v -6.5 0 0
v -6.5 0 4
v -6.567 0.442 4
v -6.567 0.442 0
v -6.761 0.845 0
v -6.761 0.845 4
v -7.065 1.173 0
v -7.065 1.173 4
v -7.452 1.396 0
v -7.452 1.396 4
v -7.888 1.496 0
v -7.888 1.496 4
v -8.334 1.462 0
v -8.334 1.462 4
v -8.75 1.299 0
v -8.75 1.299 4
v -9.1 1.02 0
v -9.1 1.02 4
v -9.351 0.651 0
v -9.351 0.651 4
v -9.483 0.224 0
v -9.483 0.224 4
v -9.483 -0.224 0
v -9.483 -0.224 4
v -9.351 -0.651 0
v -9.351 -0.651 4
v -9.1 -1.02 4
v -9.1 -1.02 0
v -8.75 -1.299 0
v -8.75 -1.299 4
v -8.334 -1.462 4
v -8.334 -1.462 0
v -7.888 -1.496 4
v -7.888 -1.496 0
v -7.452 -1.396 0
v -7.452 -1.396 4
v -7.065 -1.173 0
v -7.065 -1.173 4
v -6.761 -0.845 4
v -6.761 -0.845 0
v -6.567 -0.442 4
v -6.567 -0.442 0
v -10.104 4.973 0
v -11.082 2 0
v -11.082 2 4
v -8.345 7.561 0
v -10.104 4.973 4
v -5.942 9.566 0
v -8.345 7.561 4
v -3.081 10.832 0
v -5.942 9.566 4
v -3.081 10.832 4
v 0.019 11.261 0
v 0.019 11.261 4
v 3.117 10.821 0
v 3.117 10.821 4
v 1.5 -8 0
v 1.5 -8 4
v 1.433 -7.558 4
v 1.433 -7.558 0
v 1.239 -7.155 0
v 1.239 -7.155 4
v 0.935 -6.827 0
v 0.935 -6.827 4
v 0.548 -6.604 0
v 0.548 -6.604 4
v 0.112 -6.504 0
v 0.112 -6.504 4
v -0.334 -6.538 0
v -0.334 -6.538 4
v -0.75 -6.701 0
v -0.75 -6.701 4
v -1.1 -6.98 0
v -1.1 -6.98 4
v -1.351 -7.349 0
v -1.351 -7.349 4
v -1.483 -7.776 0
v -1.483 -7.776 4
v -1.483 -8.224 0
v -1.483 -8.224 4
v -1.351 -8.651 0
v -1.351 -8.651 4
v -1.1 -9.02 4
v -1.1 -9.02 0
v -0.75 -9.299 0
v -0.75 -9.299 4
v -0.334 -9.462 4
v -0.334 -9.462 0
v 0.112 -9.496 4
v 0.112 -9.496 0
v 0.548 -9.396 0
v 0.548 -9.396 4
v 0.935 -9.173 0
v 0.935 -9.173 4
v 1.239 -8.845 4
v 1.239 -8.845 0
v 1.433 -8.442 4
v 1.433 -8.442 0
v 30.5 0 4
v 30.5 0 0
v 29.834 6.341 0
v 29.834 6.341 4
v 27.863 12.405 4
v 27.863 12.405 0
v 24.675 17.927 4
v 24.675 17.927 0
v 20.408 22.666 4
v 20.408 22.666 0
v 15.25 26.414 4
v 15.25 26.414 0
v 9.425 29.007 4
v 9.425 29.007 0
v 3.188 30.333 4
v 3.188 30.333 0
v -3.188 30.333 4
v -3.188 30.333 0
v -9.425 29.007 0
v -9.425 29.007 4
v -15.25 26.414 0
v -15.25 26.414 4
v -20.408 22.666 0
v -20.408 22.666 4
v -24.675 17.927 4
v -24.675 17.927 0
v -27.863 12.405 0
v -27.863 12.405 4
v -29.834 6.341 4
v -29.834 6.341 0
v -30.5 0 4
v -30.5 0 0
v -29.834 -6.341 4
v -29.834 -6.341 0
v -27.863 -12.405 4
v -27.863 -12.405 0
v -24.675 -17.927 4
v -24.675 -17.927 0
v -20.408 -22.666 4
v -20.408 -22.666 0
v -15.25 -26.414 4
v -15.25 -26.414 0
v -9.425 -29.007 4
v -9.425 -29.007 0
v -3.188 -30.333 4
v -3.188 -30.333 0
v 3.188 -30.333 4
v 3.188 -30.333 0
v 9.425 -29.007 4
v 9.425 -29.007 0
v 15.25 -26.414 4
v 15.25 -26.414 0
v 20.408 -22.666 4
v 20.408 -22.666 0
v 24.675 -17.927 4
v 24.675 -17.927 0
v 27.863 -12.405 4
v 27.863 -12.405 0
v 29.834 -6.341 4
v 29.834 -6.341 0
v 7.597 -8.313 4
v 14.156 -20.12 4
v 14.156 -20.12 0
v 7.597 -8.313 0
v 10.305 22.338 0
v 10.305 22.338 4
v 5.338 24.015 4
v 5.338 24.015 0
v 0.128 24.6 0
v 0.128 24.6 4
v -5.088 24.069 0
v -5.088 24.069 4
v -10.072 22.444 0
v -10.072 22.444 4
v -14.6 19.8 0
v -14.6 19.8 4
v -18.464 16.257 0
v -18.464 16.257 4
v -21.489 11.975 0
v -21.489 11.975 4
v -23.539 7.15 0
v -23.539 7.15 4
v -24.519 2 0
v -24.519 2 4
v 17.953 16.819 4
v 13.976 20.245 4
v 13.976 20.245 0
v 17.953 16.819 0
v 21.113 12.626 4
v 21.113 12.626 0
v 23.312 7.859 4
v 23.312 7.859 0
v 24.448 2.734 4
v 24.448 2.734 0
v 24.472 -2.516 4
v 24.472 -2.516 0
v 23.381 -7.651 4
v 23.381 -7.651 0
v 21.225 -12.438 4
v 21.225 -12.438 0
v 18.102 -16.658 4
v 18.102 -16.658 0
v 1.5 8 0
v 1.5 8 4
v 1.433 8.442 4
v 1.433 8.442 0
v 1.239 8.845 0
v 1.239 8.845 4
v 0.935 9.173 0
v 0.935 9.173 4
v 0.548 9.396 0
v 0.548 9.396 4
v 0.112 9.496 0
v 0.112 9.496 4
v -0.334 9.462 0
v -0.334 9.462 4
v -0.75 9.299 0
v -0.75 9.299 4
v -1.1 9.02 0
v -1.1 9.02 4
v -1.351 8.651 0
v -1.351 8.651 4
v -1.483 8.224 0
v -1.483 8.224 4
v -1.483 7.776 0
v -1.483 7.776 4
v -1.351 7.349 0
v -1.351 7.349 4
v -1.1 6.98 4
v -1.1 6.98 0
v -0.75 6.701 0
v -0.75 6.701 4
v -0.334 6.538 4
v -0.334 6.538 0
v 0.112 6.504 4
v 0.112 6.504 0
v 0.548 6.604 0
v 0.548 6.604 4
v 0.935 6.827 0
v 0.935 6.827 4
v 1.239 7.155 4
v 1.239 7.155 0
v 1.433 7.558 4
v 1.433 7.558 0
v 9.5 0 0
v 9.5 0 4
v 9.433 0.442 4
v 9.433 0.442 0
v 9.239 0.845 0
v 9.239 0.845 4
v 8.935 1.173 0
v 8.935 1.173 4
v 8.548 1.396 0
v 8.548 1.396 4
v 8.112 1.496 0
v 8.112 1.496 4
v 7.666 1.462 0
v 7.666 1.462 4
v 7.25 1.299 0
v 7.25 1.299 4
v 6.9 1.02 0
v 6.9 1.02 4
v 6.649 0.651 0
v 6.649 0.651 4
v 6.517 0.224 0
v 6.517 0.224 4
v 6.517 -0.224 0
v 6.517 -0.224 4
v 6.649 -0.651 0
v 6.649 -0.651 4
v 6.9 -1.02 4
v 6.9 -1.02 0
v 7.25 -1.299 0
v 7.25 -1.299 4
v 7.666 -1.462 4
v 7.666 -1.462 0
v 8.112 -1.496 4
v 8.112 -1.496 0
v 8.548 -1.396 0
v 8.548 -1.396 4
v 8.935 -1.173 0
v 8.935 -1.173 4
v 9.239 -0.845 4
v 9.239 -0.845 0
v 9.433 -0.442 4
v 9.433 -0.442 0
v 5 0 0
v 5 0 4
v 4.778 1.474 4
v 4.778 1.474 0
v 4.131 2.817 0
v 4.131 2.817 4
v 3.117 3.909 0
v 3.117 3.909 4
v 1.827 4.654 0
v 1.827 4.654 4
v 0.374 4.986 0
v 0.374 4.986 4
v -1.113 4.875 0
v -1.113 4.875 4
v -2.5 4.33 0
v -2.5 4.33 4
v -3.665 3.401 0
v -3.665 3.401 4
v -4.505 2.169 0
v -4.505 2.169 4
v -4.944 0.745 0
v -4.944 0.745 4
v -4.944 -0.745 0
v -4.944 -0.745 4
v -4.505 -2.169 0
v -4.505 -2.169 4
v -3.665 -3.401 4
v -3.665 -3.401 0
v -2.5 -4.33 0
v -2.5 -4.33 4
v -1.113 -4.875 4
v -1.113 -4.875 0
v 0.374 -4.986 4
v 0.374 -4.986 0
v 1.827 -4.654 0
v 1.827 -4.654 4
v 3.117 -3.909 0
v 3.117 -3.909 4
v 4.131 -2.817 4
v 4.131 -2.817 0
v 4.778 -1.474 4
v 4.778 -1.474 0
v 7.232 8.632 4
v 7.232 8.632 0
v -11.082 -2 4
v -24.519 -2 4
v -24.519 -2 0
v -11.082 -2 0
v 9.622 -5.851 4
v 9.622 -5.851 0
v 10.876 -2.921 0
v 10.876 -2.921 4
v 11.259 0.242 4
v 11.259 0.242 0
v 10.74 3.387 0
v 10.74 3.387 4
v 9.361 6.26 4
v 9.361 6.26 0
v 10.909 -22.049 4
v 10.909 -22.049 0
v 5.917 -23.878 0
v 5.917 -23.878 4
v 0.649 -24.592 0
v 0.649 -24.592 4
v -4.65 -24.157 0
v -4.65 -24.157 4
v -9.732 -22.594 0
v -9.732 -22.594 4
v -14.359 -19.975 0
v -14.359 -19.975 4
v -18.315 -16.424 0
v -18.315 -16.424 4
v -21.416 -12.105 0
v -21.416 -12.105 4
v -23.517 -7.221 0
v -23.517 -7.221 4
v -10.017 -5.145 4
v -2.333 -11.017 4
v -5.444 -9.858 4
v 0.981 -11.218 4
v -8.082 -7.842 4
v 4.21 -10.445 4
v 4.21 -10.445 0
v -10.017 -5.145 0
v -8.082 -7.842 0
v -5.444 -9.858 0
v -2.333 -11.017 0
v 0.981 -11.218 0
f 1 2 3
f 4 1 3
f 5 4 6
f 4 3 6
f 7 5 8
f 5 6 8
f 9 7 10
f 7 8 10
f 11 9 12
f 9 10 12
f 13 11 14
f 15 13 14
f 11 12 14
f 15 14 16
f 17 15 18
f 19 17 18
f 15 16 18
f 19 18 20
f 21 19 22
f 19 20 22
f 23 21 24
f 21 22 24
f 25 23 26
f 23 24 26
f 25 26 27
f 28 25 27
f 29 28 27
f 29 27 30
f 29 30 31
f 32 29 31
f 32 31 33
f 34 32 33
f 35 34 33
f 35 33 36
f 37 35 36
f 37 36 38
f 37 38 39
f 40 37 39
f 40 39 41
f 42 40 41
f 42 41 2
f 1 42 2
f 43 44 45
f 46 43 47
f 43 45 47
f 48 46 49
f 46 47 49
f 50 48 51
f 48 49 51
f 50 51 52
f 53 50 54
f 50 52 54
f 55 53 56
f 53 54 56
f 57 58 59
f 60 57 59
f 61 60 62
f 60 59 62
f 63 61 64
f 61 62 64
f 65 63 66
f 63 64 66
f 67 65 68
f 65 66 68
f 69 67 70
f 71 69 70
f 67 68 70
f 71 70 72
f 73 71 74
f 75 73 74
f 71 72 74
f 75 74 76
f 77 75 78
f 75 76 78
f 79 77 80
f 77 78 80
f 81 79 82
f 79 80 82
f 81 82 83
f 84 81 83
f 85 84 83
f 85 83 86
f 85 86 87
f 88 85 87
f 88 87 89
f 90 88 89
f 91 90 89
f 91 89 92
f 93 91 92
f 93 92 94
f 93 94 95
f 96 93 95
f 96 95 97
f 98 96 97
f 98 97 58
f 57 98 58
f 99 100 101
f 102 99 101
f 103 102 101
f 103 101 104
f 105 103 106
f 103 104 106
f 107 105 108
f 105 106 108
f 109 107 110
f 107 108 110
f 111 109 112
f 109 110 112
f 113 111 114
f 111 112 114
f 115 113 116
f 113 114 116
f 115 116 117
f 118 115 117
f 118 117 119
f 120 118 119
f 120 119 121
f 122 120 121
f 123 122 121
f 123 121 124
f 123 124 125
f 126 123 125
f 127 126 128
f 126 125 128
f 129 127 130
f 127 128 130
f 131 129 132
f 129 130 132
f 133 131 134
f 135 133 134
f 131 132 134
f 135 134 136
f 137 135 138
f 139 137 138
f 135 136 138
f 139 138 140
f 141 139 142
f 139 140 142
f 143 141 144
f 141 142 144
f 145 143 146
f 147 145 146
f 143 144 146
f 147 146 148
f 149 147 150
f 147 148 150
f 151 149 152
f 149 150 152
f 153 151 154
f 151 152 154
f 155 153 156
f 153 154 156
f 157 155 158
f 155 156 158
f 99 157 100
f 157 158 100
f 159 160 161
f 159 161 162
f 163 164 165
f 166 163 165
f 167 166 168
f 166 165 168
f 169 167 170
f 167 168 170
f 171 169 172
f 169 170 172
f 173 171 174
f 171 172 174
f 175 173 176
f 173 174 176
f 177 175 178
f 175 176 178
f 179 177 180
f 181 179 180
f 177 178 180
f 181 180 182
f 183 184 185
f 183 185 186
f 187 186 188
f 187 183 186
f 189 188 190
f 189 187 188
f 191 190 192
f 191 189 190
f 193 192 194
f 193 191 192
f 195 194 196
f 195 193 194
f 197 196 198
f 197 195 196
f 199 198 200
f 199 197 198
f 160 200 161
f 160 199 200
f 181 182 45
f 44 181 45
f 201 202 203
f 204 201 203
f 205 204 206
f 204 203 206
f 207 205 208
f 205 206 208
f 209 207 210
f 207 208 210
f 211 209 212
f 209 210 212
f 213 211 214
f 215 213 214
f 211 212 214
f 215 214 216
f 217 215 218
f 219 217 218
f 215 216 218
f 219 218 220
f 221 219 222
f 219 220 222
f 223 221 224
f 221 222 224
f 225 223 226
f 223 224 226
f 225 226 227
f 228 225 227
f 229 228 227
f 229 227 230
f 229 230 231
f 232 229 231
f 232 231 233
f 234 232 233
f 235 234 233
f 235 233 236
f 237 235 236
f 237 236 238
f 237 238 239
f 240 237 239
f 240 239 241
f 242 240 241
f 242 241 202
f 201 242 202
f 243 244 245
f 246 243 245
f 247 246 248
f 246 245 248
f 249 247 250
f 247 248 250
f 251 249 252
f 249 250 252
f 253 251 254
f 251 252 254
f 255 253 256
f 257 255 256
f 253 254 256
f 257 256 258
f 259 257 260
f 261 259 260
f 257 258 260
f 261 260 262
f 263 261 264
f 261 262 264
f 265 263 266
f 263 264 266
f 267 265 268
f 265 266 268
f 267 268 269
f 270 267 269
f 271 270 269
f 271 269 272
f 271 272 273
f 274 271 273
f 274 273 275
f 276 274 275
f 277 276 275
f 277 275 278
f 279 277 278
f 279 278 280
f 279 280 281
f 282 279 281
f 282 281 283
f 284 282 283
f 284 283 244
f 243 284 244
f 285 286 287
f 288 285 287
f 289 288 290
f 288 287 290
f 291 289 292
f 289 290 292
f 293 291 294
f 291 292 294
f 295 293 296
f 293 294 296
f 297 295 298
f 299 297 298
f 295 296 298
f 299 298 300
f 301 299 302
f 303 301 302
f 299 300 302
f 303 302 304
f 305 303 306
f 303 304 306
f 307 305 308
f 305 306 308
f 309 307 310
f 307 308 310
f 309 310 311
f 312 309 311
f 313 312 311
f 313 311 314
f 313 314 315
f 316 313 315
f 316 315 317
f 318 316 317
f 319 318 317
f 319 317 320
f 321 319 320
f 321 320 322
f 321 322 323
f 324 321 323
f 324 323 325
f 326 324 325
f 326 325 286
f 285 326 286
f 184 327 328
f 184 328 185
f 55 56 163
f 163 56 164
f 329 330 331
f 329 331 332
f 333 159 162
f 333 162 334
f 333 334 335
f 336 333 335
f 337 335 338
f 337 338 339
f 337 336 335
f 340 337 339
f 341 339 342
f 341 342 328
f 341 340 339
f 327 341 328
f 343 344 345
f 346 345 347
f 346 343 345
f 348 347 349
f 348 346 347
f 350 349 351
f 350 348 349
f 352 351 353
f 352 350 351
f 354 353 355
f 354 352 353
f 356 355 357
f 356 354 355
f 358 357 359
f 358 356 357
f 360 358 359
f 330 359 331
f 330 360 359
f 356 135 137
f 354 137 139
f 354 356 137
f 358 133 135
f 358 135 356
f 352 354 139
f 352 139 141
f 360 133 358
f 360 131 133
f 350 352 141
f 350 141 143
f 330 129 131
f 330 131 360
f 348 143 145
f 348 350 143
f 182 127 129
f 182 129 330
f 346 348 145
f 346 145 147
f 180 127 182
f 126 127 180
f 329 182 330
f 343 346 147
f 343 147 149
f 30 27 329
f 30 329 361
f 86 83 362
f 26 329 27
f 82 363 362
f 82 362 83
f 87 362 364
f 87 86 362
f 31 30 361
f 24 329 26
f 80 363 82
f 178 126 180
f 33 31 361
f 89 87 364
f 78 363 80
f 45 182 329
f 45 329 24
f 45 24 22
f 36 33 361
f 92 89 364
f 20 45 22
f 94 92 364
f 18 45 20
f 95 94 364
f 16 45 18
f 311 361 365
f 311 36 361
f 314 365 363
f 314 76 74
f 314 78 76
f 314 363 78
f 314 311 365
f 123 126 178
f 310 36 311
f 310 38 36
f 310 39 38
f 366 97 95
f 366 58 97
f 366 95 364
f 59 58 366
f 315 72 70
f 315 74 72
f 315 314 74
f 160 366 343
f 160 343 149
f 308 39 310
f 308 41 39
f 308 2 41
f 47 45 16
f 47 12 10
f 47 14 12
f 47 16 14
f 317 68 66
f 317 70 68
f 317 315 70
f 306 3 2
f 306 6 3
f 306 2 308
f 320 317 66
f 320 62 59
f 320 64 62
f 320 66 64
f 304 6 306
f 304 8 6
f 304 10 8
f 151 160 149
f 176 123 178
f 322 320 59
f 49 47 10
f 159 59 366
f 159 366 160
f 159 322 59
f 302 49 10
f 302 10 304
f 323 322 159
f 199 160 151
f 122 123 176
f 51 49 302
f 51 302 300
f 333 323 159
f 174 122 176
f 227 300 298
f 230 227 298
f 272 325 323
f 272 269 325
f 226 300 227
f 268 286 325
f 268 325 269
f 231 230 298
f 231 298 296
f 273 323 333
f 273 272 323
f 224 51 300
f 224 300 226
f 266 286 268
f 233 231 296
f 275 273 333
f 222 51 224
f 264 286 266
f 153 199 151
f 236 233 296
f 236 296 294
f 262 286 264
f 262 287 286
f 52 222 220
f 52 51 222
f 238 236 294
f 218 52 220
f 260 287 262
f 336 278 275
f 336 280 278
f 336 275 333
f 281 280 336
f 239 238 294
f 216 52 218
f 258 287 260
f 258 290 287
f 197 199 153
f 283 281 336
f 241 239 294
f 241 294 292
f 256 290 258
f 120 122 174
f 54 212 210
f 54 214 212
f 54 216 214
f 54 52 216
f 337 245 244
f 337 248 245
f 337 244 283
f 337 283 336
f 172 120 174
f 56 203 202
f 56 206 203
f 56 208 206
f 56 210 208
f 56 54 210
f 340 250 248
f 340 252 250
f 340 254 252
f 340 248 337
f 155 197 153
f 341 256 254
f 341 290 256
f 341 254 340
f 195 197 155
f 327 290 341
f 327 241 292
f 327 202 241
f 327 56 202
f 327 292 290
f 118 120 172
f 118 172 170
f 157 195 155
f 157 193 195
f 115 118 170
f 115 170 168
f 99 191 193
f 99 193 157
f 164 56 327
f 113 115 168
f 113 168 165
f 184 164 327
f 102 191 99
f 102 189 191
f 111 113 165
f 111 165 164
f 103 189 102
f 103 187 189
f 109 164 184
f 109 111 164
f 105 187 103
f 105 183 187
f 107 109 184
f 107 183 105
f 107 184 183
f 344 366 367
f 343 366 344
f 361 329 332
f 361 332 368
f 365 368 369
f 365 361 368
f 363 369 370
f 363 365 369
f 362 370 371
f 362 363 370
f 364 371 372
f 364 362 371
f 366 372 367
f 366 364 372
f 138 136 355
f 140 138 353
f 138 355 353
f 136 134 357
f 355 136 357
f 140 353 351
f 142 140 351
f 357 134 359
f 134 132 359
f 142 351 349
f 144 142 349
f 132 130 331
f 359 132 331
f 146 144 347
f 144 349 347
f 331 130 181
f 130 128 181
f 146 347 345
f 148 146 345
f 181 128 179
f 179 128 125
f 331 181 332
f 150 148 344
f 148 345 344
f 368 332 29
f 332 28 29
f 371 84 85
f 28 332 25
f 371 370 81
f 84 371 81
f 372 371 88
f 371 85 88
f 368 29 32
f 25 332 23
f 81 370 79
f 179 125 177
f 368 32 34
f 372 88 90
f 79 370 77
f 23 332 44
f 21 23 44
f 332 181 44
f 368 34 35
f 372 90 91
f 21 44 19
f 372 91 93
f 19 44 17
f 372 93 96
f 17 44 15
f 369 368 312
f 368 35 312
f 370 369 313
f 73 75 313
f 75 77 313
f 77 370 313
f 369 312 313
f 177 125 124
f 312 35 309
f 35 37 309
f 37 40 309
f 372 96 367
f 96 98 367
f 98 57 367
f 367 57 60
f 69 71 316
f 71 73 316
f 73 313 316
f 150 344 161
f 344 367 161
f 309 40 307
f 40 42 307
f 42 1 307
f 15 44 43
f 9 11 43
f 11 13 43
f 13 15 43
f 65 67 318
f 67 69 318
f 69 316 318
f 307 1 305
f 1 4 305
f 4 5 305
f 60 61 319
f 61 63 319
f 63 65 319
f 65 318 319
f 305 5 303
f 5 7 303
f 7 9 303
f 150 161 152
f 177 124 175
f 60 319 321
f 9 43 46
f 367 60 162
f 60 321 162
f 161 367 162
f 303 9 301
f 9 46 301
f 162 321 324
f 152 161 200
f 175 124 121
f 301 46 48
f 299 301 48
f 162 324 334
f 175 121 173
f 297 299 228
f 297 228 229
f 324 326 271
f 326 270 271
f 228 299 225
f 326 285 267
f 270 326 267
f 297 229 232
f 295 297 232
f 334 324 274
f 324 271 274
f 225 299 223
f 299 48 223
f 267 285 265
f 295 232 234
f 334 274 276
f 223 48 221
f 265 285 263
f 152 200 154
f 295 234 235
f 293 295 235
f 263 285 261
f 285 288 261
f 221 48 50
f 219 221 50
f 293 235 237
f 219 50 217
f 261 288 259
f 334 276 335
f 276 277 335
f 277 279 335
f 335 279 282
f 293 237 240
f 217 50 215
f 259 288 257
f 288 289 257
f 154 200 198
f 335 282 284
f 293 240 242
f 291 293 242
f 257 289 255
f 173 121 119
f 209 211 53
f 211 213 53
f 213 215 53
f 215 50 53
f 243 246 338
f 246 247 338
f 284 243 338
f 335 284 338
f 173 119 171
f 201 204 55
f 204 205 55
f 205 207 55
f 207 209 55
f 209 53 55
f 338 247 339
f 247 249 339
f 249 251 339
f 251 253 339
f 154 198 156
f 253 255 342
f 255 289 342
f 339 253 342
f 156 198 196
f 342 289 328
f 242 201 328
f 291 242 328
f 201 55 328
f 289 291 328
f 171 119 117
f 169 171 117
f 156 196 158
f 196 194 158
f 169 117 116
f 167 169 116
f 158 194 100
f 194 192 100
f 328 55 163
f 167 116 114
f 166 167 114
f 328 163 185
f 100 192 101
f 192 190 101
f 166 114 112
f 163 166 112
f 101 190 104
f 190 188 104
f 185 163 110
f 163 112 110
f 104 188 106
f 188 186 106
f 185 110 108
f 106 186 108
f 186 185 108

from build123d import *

# Parameters (mm, degrees)
SKETCH_1_R          = 30.5
EXTRUDE_1_DEPTH     = 4
CUT_EXTRUDE_1_REACH = 6
SKETCH_2_R          = 5
SKETCH_2_R_2        = 1.5


with BuildPart() as part:
    # 草图1 → 凸台-拉伸1 (new body)
    with BuildSketch(Plane.XY):
        Circle(SKETCH_1_R)
    extrude(amount=EXTRUDE_1_DEPTH)

    # 草图2 → 切除-拉伸1 (cut, up to next)
    with BuildSketch(Plane.XY.offset(4), mode=Mode.PRIVATE) as cut_extrude_1_sk1:
        Circle(SKETCH_2_R)
    cut_extrude_1_tool1 = extrude(cut_extrude_1_sk1.sketch, amount=-CUT_EXTRUDE_1_REACH, mode=Mode.PRIVATE) & part.part
    add(cut_extrude_1_tool1.solids().sort_by_distance((0, 0, 4))[0], mode=Mode.SUBTRACT)
    # 草图2 → 切除-拉伸1 (cut, up to next)
    with BuildSketch(Plane.XY.offset(4), mode=Mode.PRIVATE) as cut_extrude_1_sk2:
        with Locations((-8, 0)):
            Circle(SKETCH_2_R_2)
    cut_extrude_1_tool2 = extrude(cut_extrude_1_sk2.sketch, amount=-CUT_EXTRUDE_1_REACH, mode=Mode.PRIVATE) & part.part
    add(cut_extrude_1_tool2.solids().sort_by_distance((-8, 0, 4))[0], mode=Mode.SUBTRACT)
    # 草图2 → 切除-拉伸1 (cut, up to next)
    with BuildSketch(Plane.XY.offset(4), mode=Mode.PRIVATE) as cut_extrude_1_sk3:
        with Locations((0, 8)):
            Circle(SKETCH_2_R_2)
    cut_extrude_1_tool3 = extrude(cut_extrude_1_sk3.sketch, amount=-CUT_EXTRUDE_1_REACH, mode=Mode.PRIVATE) & part.part
    add(cut_extrude_1_tool3.solids().sort_by_distance((0, 8, 4))[0], mode=Mode.SUBTRACT)
    # 草图2 → 切除-拉伸1 (cut, up to next)
    with BuildSketch(Plane.XY.offset(4), mode=Mode.PRIVATE) as cut_extrude_1_sk4:
        with Locations((8, 0)):
            Circle(SKETCH_2_R_2)
    cut_extrude_1_tool4 = extrude(cut_extrude_1_sk4.sketch, amount=-CUT_EXTRUDE_1_REACH, mode=Mode.PRIVATE) & part.part
    add(cut_extrude_1_tool4.solids().sort_by_distance((8, 0, 4))[0], mode=Mode.SUBTRACT)
    # 草图2 → 切除-拉伸1 (cut, up to next)
    with BuildSketch(Plane.XY.offset(4), mode=Mode.PRIVATE) as cut_extrude_1_sk5:
        with Locations((0, -8)):
            Circle(SKETCH_2_R_2)
    cut_extrude_1_tool5 = extrude(cut_extrude_1_sk5.sketch, amount=-CUT_EXTRUDE_1_REACH, mode=Mode.PRIVATE) & part.part
    add(cut_extrude_1_tool5.solids().sort_by_distance((0, -8, 4))[0], mode=Mode.SUBTRACT)
    # 草图2 → 切除-拉伸1 (cut, up to next)
    with BuildSketch(Plane.XY.offset(4), mode=Mode.PRIVATE) as cut_extrude_1_sk6:
        with BuildLine():
            Line((-24.519245453, -2), (-11.082272055, -2))
            ThreePointArc((-11.082272055, -2), (-5.44406657, -9.857935539), (4.209531065, -10.444931887))
            Line((4.209531065, -10.444931887), (10.909403583, -22.049451491))
            ThreePointArc((10.909403583, -22.049451491), (-12.116190623, -21.410075254), (-24.519245453, -2))
        make_face()
    cut_extrude_1_tool6 = extrude(cut_extrude_1_sk6.sketch, amount=-CUT_EXTRUDE_1_REACH, mode=Mode.PRIVATE) & part.part
    add(cut_extrude_1_tool6.solids().sort_by_distance((-7.903429, -14.053546, 4))[0], mode=Mode.SUBTRACT)
    # 草图2 → 切除-拉伸1 (cut, up to next)
    with BuildSketch(Plane.XY.offset(4), mode=Mode.PRIVATE) as cut_extrude_1_sk7:
        with BuildLine():
            Line((-24.519245453, 2), (-11.082272055, 2))
            ThreePointArc((-11.082272055, 2), (-5.942459521, 9.565768592), (3.117477103, 10.821187108))
            Line((3.117477103, 10.821187108), (10.304921695, 22.338352367))
            ThreePointArc((10.304921695, 22.338352367), (-12.406606878, 21.243104843), (-24.519245453, 2))
        make_face()
    cut_extrude_1_tool7 = extrude(cut_extrude_1_sk7.sketch, amount=-CUT_EXTRUDE_1_REACH, mode=Mode.PRIVATE) & part.part
    add(cut_extrude_1_tool7.solids().sort_by_distance((-8.308104, 14.002241, 4))[0], mode=Mode.SUBTRACT)
    # 草图2 → 切除-拉伸1 (cut, up to next)
    with BuildSketch(Plane.XY.offset(4), mode=Mode.PRIVATE) as cut_extrude_1_sk8:
        with BuildLine():
            Line((14.155543142, -20.119989959), (7.597126799, -8.312666138))
            ThreePointArc((7.597126799, -8.312666138), (11.258684205, 0.242453893), (7.232225933, 8.632013784))
            Line((7.232225933, 8.632013784), (13.976038331, 20.245092002))
            ThreePointArc((13.976038331, 20.245092002), (24.600435555, 0.109398924), (14.155543142, -20.119989959))
        make_face()
    cut_extrude_1_tool8 = extrude(cut_extrude_1_sk8.sketch, amount=-CUT_EXTRUDE_1_REACH, mode=Mode.PRIVATE) & part.part
    add(cut_extrude_1_tool8.solids().sort_by_distance((16.242658, 0.143003, 4))[0], mode=Mode.SUBTRACT)


solid = part.part
